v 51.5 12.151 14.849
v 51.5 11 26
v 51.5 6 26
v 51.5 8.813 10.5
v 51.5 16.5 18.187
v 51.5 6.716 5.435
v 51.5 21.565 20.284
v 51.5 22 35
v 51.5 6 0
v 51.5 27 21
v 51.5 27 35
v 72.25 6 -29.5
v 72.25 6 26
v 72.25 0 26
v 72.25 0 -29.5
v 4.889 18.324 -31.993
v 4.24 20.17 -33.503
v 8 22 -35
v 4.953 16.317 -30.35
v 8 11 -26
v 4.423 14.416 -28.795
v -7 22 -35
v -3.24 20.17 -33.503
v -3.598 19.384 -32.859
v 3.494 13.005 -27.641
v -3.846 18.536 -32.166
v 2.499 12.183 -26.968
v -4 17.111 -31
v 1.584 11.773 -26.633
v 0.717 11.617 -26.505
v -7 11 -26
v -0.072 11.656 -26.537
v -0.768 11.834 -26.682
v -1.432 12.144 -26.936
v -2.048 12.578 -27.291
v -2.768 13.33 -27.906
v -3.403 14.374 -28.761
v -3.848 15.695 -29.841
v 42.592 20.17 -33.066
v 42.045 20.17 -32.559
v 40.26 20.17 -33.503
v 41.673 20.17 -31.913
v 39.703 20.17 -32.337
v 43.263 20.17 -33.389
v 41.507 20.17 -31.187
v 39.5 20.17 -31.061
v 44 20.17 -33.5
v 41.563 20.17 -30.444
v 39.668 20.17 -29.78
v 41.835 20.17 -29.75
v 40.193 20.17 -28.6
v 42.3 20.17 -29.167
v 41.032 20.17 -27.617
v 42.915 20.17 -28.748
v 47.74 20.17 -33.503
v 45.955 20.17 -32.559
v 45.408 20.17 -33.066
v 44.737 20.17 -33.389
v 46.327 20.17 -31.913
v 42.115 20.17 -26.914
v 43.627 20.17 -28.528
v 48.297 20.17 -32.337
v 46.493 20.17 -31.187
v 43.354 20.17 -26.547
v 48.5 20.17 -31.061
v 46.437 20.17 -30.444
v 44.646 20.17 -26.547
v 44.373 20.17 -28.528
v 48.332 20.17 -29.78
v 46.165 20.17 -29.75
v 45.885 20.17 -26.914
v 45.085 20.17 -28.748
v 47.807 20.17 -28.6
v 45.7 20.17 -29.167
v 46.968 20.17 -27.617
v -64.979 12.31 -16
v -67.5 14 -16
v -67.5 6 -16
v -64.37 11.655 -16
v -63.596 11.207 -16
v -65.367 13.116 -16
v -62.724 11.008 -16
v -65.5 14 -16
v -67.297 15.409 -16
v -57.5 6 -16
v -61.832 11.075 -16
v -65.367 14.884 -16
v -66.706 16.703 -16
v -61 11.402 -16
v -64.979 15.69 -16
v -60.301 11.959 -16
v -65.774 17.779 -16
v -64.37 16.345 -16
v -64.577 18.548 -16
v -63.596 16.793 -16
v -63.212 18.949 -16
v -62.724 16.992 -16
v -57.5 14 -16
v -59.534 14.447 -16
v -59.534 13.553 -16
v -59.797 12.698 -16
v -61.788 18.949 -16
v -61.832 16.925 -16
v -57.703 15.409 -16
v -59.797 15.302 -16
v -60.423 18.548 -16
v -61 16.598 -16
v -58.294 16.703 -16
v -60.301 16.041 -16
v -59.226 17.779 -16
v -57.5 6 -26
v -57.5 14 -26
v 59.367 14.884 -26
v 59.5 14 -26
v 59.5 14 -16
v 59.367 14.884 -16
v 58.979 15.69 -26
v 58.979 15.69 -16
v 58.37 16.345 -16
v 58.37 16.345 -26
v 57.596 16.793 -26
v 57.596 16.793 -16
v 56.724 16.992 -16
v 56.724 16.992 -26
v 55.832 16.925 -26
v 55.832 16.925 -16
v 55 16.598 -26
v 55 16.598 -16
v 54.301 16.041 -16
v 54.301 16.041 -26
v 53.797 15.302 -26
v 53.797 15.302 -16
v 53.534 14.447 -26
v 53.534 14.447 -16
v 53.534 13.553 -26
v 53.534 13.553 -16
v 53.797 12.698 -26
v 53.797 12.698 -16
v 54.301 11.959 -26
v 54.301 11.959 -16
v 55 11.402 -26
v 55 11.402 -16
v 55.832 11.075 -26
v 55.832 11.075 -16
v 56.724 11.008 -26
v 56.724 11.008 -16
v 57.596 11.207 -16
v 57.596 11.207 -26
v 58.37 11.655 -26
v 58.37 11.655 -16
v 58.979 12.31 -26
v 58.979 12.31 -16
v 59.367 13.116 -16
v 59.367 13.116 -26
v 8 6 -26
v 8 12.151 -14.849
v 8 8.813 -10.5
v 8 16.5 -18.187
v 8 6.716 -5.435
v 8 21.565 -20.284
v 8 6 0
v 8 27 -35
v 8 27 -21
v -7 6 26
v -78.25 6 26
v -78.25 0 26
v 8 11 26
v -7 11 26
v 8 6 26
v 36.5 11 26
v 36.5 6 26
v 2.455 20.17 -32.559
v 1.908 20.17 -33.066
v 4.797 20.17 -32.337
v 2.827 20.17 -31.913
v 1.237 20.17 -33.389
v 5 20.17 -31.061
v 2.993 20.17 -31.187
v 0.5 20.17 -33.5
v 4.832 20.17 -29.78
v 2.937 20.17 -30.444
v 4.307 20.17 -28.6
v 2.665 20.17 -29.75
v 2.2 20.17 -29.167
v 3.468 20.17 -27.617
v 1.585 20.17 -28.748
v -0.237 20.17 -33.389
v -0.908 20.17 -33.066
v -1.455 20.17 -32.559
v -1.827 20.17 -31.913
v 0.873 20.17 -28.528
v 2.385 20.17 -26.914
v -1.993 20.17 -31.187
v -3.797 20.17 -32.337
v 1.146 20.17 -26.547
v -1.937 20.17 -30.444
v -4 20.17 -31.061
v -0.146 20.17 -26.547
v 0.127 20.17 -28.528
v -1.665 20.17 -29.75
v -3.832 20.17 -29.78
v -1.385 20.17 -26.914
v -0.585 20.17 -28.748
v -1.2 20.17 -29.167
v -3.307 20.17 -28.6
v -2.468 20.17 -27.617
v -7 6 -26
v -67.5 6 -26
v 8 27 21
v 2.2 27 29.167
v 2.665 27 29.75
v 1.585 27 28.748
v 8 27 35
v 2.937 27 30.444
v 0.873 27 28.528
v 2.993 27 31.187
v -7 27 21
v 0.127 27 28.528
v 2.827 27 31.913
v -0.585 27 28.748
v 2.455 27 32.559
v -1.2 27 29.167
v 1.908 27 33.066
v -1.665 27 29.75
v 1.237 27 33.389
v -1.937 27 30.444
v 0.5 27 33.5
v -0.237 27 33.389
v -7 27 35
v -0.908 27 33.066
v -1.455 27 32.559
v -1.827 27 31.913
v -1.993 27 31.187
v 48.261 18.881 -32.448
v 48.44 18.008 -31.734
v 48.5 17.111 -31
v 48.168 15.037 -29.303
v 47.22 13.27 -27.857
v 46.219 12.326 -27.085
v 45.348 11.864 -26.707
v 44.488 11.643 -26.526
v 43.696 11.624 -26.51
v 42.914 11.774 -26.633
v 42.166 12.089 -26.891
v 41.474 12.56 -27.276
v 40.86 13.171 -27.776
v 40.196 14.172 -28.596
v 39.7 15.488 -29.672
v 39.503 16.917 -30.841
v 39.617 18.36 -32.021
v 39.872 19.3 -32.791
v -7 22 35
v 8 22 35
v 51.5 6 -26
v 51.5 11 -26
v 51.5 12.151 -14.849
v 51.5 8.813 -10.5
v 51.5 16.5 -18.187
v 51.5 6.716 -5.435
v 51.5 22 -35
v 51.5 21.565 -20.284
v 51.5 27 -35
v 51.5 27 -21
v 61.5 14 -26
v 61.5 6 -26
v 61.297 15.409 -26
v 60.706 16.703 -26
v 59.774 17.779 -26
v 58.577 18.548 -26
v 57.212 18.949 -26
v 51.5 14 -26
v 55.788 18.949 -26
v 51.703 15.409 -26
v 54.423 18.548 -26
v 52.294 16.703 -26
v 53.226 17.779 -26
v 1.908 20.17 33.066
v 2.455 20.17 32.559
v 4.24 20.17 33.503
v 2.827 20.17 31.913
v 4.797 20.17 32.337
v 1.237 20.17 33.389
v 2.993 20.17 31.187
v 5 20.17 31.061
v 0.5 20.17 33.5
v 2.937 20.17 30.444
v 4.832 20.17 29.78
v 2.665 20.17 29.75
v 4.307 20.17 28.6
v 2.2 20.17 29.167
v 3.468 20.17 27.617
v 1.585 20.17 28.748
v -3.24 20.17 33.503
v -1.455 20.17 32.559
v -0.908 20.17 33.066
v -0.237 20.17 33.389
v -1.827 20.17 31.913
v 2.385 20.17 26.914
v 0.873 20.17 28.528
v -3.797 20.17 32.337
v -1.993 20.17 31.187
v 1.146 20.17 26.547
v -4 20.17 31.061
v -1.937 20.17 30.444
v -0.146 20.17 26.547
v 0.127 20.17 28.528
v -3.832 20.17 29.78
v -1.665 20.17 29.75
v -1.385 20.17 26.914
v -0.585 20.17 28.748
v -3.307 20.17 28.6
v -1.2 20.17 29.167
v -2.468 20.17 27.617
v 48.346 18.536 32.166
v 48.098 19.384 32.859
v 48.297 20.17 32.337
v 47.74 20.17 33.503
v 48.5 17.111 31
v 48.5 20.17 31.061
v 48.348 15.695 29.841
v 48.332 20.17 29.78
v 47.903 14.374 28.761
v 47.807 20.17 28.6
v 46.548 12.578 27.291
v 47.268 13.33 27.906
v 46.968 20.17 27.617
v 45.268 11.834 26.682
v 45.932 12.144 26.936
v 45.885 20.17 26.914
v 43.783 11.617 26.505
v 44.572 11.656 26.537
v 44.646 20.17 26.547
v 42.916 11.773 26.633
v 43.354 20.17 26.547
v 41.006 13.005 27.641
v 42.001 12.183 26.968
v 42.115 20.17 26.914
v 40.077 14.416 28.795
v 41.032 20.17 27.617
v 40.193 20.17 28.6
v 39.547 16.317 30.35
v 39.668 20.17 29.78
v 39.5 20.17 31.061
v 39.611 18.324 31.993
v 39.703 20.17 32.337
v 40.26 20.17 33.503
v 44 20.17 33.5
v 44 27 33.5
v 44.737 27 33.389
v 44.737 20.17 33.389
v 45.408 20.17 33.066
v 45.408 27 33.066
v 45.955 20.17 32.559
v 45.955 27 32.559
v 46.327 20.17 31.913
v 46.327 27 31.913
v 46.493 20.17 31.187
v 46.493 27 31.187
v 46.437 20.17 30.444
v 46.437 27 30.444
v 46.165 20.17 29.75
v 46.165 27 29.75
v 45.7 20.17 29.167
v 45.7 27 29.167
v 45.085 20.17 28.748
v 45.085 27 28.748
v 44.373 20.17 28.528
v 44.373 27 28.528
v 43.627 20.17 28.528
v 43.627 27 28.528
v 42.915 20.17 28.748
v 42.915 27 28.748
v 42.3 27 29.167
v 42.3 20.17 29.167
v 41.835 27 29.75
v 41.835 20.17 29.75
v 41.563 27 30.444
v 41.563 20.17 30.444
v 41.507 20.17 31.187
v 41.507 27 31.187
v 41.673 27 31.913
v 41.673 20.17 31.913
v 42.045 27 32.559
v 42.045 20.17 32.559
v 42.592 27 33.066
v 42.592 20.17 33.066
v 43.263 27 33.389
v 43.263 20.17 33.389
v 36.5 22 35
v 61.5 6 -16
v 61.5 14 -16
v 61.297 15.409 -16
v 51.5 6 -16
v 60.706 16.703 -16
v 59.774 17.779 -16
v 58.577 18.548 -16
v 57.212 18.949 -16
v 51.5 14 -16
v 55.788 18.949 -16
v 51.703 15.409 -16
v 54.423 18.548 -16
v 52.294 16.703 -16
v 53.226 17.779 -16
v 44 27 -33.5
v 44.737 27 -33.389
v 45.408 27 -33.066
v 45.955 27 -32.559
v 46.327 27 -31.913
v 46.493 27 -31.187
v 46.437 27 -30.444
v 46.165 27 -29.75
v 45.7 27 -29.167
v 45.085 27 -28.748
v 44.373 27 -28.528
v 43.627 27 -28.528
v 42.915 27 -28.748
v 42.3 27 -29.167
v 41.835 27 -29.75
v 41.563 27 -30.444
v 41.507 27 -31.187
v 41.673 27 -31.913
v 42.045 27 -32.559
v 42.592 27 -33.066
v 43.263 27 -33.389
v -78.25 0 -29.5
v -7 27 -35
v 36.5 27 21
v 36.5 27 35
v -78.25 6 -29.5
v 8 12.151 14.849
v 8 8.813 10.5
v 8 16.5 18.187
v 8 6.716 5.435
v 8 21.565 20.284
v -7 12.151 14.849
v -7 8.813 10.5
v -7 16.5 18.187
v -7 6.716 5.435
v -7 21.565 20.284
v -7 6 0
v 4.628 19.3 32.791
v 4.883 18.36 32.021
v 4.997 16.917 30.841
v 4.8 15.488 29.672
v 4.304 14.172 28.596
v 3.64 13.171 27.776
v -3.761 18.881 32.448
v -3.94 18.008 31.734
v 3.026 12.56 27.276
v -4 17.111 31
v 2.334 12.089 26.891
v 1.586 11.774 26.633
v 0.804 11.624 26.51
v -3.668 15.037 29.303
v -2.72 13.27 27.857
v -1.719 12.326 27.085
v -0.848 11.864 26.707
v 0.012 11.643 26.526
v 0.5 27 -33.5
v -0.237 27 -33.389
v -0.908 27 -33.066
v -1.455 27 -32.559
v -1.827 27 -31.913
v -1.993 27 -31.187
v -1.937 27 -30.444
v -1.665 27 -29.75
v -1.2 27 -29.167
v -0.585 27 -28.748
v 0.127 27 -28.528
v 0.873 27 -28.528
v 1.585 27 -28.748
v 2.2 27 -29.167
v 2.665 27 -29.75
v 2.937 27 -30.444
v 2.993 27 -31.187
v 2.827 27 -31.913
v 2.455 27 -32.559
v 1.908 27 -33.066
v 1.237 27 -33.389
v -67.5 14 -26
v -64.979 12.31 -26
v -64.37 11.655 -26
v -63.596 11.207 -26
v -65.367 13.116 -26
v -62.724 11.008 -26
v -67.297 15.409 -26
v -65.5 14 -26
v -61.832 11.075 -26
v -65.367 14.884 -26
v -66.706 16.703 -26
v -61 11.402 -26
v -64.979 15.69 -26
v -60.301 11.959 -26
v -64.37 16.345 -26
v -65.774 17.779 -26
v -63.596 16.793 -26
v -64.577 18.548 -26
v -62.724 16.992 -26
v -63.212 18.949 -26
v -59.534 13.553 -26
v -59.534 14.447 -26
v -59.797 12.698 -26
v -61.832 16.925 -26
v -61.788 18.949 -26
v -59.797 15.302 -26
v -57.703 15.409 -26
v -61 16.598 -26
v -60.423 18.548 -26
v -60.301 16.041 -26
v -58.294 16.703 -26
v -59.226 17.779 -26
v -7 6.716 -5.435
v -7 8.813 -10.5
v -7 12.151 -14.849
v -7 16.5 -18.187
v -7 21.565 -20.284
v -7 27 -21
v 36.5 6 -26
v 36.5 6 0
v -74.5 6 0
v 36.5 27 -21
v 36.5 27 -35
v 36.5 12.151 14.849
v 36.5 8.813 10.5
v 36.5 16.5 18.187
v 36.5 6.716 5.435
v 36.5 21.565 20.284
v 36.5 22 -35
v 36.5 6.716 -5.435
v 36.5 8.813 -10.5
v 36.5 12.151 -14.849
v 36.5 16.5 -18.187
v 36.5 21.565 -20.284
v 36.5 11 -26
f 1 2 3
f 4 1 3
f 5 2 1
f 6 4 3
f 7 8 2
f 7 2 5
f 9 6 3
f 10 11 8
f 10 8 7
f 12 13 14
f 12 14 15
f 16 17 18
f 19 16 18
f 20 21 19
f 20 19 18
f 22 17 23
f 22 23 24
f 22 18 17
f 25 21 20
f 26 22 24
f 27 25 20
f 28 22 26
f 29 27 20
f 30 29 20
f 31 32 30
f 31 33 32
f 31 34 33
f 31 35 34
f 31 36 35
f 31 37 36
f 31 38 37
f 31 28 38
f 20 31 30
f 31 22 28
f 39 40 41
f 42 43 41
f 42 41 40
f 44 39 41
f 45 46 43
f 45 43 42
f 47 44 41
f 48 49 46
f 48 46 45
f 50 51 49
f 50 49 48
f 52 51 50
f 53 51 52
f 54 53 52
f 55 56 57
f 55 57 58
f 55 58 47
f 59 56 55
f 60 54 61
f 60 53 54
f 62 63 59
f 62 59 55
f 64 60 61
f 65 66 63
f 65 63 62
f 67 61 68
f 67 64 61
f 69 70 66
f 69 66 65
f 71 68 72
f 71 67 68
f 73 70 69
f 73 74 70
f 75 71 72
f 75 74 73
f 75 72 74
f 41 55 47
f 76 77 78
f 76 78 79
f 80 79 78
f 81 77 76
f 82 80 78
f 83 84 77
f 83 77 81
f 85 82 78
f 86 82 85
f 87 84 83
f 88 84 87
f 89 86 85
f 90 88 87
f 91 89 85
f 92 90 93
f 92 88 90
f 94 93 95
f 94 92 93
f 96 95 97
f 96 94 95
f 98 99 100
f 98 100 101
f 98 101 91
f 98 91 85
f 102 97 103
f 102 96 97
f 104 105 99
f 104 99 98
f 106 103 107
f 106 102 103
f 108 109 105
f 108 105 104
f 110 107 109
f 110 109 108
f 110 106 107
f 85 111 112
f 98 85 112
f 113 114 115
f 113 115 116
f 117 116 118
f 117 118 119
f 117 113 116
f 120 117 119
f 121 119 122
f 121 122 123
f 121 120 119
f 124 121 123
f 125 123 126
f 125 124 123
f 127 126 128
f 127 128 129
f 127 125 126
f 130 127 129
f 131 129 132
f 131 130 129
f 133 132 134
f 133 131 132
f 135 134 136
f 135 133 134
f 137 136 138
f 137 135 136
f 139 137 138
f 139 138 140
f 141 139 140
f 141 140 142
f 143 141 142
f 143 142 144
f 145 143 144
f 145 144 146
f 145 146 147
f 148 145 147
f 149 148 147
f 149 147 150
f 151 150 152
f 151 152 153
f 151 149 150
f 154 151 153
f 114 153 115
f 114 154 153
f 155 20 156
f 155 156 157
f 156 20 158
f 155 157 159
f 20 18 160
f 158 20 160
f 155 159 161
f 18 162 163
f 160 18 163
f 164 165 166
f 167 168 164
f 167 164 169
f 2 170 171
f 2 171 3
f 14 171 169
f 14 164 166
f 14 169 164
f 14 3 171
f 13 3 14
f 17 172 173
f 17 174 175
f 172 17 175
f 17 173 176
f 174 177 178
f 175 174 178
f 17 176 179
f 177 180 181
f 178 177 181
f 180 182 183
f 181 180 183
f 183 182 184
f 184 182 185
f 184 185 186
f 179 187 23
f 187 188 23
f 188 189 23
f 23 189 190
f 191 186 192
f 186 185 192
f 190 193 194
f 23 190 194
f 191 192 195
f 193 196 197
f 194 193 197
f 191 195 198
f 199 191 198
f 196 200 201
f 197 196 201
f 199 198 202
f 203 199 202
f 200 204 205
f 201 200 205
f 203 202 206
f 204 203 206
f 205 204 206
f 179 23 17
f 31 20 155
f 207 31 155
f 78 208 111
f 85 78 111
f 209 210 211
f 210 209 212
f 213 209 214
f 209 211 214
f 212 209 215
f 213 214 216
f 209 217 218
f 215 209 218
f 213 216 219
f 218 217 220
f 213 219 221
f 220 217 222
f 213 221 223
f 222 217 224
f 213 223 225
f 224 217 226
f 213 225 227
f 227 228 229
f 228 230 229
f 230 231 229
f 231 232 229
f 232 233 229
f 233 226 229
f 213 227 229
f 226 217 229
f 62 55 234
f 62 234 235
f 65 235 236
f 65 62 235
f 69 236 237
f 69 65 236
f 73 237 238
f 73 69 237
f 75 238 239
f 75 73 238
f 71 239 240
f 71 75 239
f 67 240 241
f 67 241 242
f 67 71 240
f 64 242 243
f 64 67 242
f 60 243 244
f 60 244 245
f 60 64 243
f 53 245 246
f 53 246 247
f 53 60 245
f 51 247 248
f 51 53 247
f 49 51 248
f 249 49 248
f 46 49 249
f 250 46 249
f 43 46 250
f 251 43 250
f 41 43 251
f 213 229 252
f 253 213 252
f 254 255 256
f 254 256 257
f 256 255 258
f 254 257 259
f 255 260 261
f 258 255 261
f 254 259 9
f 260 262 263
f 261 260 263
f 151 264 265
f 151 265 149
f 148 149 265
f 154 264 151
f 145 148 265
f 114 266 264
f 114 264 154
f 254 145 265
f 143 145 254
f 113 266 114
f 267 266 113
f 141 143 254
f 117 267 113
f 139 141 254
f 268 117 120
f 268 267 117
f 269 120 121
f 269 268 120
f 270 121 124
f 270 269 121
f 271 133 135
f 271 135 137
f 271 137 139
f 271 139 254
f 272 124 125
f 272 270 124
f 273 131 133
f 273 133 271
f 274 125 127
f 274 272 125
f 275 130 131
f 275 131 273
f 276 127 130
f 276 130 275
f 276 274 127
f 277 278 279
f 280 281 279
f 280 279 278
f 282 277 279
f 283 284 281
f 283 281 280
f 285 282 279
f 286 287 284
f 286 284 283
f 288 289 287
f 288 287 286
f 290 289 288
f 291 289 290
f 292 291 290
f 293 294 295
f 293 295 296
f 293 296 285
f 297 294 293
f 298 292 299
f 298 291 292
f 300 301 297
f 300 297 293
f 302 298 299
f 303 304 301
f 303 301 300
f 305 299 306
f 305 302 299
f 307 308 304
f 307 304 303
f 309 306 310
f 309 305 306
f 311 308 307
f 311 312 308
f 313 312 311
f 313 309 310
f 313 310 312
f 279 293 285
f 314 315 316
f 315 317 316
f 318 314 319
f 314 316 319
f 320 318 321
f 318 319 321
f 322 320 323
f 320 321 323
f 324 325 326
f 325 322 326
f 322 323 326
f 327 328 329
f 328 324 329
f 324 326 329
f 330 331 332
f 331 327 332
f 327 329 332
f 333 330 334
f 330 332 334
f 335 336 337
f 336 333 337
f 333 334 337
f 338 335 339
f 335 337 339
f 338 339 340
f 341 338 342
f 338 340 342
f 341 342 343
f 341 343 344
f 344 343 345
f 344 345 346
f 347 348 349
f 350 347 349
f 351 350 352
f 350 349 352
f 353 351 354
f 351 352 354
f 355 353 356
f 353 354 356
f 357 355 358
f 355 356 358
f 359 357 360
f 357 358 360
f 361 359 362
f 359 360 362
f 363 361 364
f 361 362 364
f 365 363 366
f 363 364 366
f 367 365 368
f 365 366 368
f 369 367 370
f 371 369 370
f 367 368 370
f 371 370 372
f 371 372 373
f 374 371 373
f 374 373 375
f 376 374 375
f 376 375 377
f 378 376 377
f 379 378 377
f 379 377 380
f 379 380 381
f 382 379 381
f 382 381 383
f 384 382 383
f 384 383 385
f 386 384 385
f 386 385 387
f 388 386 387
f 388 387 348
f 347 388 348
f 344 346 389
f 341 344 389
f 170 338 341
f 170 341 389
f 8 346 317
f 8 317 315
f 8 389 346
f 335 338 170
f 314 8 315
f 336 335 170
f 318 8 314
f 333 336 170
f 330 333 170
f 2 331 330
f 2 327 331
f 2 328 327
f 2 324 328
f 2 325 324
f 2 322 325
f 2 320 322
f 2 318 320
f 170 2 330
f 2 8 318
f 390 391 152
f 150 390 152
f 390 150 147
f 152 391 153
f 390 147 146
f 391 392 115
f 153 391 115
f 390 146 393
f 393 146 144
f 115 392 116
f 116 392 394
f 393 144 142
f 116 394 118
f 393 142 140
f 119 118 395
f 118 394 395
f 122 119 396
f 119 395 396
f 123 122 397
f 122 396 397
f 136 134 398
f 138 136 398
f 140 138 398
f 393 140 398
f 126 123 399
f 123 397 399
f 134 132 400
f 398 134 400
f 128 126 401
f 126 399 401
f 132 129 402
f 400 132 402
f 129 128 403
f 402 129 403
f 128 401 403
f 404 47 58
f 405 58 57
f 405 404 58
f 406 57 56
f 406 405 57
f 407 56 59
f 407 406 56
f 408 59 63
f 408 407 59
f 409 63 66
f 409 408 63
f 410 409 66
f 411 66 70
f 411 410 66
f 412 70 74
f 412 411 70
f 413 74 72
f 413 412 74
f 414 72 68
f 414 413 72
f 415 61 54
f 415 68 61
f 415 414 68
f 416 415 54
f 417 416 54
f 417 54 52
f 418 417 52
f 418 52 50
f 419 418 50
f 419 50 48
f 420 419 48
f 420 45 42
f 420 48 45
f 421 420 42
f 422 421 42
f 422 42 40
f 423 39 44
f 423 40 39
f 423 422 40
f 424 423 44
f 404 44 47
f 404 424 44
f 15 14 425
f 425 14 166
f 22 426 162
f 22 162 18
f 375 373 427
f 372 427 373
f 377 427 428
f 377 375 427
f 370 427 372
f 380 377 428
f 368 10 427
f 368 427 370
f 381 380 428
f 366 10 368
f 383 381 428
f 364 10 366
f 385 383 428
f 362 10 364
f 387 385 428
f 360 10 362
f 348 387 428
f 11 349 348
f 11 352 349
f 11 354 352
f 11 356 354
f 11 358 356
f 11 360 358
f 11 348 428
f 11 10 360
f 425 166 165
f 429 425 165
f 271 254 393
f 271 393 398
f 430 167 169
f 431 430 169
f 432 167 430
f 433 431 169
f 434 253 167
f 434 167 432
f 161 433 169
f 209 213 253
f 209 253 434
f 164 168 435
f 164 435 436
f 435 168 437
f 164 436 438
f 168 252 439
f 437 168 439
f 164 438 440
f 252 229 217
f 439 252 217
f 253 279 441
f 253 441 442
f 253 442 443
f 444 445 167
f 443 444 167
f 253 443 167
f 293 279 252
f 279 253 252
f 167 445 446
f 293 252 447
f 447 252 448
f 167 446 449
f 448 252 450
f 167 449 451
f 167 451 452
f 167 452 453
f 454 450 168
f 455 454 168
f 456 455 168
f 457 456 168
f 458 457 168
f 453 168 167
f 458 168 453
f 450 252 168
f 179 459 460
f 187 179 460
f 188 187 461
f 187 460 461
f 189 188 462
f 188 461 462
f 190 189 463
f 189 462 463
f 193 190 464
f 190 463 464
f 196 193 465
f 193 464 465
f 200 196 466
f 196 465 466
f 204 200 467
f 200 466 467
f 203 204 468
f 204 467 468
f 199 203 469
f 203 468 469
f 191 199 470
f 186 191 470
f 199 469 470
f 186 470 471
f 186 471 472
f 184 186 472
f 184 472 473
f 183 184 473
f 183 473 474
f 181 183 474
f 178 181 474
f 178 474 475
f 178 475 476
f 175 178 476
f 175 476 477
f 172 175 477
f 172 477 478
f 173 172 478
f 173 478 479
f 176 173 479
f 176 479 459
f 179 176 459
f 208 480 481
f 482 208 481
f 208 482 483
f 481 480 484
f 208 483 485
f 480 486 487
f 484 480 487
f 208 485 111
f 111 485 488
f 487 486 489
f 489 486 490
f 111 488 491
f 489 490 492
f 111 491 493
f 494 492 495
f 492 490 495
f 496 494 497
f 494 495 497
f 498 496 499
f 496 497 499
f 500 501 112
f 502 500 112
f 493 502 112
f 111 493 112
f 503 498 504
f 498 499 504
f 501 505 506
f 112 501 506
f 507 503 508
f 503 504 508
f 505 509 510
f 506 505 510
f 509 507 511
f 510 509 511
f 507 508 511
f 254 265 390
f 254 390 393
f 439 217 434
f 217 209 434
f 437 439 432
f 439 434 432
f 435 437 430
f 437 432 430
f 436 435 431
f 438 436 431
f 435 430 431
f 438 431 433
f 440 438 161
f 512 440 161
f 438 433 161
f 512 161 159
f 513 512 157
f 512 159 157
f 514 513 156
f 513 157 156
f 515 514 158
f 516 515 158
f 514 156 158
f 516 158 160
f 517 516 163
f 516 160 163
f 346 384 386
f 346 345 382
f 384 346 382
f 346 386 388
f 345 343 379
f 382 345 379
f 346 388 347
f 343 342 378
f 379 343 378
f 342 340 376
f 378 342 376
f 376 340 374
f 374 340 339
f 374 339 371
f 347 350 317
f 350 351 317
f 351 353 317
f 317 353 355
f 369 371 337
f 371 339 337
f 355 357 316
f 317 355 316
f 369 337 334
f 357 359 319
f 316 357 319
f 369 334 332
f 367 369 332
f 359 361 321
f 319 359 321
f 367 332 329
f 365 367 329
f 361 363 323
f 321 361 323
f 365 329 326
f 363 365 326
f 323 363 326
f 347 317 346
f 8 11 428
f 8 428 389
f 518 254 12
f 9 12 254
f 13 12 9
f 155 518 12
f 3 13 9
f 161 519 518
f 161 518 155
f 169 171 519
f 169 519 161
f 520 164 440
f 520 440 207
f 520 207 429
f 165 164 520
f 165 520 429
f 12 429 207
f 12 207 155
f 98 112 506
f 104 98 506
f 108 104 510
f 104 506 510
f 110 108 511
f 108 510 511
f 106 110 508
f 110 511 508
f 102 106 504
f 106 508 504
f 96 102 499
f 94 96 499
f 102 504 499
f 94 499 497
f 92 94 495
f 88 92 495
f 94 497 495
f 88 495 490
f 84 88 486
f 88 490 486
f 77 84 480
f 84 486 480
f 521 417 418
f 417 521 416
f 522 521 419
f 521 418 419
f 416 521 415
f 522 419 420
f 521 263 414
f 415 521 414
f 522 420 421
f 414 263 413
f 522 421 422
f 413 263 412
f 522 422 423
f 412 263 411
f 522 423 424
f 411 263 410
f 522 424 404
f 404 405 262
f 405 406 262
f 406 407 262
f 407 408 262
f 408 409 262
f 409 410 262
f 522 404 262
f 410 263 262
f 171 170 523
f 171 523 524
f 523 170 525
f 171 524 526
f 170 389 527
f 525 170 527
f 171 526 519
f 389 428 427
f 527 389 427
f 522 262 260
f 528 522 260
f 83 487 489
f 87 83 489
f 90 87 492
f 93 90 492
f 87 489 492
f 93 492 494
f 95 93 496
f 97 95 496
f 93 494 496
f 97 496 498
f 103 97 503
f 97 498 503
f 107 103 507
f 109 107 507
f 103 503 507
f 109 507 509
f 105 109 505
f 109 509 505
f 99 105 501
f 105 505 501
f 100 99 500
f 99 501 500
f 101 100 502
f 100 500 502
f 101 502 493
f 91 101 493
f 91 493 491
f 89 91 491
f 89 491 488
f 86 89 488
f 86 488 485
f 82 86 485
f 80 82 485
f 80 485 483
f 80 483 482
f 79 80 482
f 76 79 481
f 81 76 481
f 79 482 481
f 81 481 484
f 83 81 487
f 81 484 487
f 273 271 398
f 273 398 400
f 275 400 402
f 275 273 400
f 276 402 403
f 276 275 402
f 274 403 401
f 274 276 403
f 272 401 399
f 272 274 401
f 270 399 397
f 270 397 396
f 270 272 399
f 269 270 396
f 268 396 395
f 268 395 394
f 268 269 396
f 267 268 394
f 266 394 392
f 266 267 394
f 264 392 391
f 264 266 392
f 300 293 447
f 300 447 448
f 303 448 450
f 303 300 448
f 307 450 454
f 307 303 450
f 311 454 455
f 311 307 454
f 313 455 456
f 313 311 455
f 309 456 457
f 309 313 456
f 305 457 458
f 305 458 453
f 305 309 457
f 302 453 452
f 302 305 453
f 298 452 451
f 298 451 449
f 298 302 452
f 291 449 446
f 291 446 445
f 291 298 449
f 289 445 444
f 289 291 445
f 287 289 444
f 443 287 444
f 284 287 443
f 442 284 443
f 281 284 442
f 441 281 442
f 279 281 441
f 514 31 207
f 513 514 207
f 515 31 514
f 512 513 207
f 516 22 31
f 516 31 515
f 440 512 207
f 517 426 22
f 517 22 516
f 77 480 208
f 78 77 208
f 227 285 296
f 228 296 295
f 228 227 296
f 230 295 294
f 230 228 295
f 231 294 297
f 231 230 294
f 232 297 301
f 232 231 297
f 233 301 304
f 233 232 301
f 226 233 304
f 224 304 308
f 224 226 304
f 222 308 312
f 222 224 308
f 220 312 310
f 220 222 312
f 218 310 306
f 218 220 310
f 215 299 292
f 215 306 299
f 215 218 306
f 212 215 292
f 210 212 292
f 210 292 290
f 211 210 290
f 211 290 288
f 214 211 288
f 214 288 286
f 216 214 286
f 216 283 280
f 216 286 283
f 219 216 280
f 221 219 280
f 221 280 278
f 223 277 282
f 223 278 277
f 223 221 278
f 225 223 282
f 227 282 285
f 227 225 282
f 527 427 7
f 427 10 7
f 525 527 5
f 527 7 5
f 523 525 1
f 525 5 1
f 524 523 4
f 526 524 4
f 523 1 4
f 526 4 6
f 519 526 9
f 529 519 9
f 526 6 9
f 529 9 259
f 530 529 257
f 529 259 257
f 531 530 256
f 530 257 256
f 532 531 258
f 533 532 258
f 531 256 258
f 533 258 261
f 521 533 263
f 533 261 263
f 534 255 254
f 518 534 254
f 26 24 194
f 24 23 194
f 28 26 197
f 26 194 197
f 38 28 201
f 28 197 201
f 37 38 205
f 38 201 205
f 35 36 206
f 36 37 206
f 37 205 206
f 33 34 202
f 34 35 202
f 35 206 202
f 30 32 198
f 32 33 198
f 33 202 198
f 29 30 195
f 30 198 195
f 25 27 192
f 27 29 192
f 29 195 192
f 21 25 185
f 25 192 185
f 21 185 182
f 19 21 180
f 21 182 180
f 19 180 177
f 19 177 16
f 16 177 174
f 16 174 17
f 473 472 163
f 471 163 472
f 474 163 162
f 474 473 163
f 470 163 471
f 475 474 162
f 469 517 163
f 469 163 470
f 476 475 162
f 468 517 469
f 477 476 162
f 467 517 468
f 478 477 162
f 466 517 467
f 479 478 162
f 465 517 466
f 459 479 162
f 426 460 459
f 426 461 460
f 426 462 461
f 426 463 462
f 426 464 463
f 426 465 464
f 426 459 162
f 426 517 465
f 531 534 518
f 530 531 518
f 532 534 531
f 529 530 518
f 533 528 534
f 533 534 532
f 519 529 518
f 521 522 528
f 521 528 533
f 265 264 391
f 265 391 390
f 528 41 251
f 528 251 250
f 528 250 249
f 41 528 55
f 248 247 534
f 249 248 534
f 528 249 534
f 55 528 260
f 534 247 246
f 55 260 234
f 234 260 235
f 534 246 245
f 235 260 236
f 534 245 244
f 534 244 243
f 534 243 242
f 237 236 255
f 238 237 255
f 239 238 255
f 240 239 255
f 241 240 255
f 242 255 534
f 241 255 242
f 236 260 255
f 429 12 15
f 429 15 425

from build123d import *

# Parameters (mm, degrees)
CROQUIS1_W                                 = 149
CROQUIS1_H                                 = 53
SALIENTE_EXTRUIR1_DEPTH                    = 6
SALIENTE_EXTRUIR2_DEPTH                    = 15
SALIENTE_EXTRUIR5_DEPTH                    = 15
CROQUIS3_R                                 = 21
CORTAR_EXTRUIR2_DEPTH                      = 140.238105417
CROQUIS6_R                                 = 3
SALIENTE_EXTRUIR11_DEPTH                   = 10
CROQUIS12_W                                = 53
CROQUIS12_H                                = 6
SALIENTE_EXTRUIR24_DEPTH                   = 3.75
CROQUIS13_W                                = 152.75
CROQUIS13_H                                = 6
SALIENTE_EXTRUIR25_DEPTH                   = 3
CROQUIS14_W                                = 2.25
CROQUIS14_H                                = 56
CORTAR_EXTRUIR3_DEPTH                      = 96.928684448
CROQUIS17_W                                = 150.5
CROQUIS17_H                                = 0.5
CORTAR_EXTRUIR4_DEPTH                      = 96.928684448
CROQUIS18_W                                = 100
CROQUIS18_H                                = 60
CORTAR_EXTRUIR5_DEPTH                      = 88.876689173
SALIENTE_EXTRUIR27_DEPTH                   = 15
CROQUIS20_R                                = 2.5
CORTAR_EXTRUIR6_DEPTH                      = 10
SIMETR_A6_COPY_1_DEPTH                     = 15
SIMETR_A6_COPY_2_SKETCH_R                  = 2.5
SIMETR_A6_COPY_2_DEPTH                     = 10
CROQUIS21_R                                = 4.5
CORTAR_EXTRUIR7_DEPTH                      = 10
SIMETR_A7_AT_THE_SECOND_PLANE_COPY_1_SKE_R = 4.5
SIMETR_A7_AT_THE_SECOND_PLANE_COPY_1_DEPTH = 10


with BuildPart() as part:
    # Croquis1 → Saliente-Extruir1 (new body)
    with BuildSketch(Plane(origin=(0, 0, 0), x_dir=(1, 0, 0), z_dir=(0, 1, 0))):
        Rectangle(CROQUIS1_W, CROQUIS1_H)
    extrude(amount=SALIENTE_EXTRUIR1_DEPTH)

    # Croquis2 → Saliente-Extruir2 (add)
    with BuildSketch(Plane(origin=(51.5, 0, 0), x_dir=(0, 0, -1), z_dir=(1, 0, 0))):
        with BuildLine():
            Line((26, 6), (-26, 6))
            Line((-26, 6), (-26, 27))
            ThreePointArc((-26, 27), (0, 53), (26, 27))
            Line((26, 27), (26, 6))
        make_face()
    extrude(amount=-SALIENTE_EXTRUIR2_DEPTH)

    # Croquis5 → Saliente-Extruir5 (add)
    with BuildSketch(Plane.ZY.offset(-8)):
        with BuildLine():
            Line((-26, 6), (26, 6))
            Line((26, 6), (26, 27))
            ThreePointArc((26, 27), (0, 53), (-26, 27))
            Line((-26, 27), (-26, 6))
        make_face()
    extrude(amount=SALIENTE_EXTRUIR5_DEPTH)

    # Croquis3 → Cortar-Extruir2 (cut, through all)
    with BuildSketch(Plane(origin=(51.5, 0, 0), x_dir=(0, 0, -1), z_dir=(1, 0, 0))):
        with Locations(Location((0, 27, 0), (0, 0, 270))):
            Circle(CROQUIS3_R)
    extrude(amount=-CORTAR_EXTRUIR2_DEPTH, mode=Mode.SUBTRACT)

    # Croquis12 → Saliente-Extruir24 (add)
    with BuildSketch(Plane.ZY.offset(74.5)):
        with Locations((0, 3)):
            Rectangle(CROQUIS12_W, CROQUIS12_H)
    extrude(amount=SALIENTE_EXTRUIR24_DEPTH)

    # Croquis13 → Saliente-Extruir25 (add)
    with BuildSketch(Plane(origin=(0, 0, -26.5), x_dir=(-1, 0, 0), z_dir=(0, 0, -1))):
        with Locations((1.875, 3)):
            Rectangle(CROQUIS13_W, CROQUIS13_H)
    extrude(amount=SALIENTE_EXTRUIR25_DEPTH)

    # Croquis14 → Cortar-Extruir3 (cut, through all)
    with BuildSketch(Plane(origin=(0, 6, 0), x_dir=(1, 0, 0), z_dir=(0, 1, 0))):
        with Locations((73.375, 1.5)):
            Rectangle(CROQUIS14_W, CROQUIS14_H)
    extrude(amount=-CORTAR_EXTRUIR3_DEPTH, mode=Mode.SUBTRACT)

    # Croquis17 → Cortar-Extruir4 (cut, through all)
    with BuildSketch(Plane(origin=(0, 6, 0), x_dir=(1, 0, 0), z_dir=(0, 1, 0))):
        with Locations((-3, -26.25)):
            Rectangle(CROQUIS17_W, CROQUIS17_H)
    extrude(amount=-CORTAR_EXTRUIR4_DEPTH, mode=Mode.SUBTRACT)

    # Croquis18 → Cortar-Extruir5 (cut, through all)
    with BuildSketch(Plane(origin=(0, 27, 0), x_dir=(1, 0, 0), z_dir=(0, 1, 0))):
        with Locations((22.25, 1.75)):
            Rectangle(CROQUIS18_W, CROQUIS18_H)
    extrude(amount=CORTAR_EXTRUIR5_DEPTH, mode=Mode.SUBTRACT)

    # Croquis19 → Saliente-Extruir27 (add)
    with BuildSketch(Plane(origin=(51.5, 0, 0), x_dir=(0, 0, -1), z_dir=(1, 0, 0))):
        Polygon((-26, 27), (-35, 27), (-35, 22), (-26, 11), align=None)
    saliente_extruir27 = extrude(amount=-SALIENTE_EXTRUIR27_DEPTH)

    # Croquis20 → Cortar-Extruir6 (cut)
    with BuildSketch(Plane(origin=(0, 27, 0), x_dir=(1, 0, 0), z_dir=(0, 1, 0))):
        with Locations(Location((44, -31, 0), (0, 0, 270))):
            Circle(CROQUIS20_R)
    cortar_extruir6 = extrude(amount=-CORTAR_EXTRUIR6_DEPTH, mode=Mode.SUBTRACT)

    # Simetría3: Saliente-Extruir27 across plane
    add(saliente_extruir27.mirror(Plane.XY))

    # Simetr_a3 2: Cortar-Extruir6 across plane
    add(cortar_extruir6.mirror(Plane.XY), mode=Mode.SUBTRACT)

    # Simetría6: Saliente-Extruir27, Cortar-Extruir6 across plane
    add(saliente_extruir27.mirror(Plane(origin=(22.25, 0, 0), x_dir=(0, 0, 1), z_dir=(1, 0, 0))))
    add(cortar_extruir6.mirror(Plane(origin=(22.25, 0, 0), x_dir=(0, 0, 1), z_dir=(1, 0, 0))), mode=Mode.SUBTRACT)

    # Simetría6 copy 1 sketch → Simetría6 copy 1 (add)
    with BuildSketch(Plane.ZY.offset(7)):
        Polygon((-26, 27), (-35, 27), (-35, 22), (-26, 11), align=None)
    extrude(amount=-SIMETR_A6_COPY_1_DEPTH)

    # Simetría6 copy 2 sketch → Simetría6 copy 2 (cut)
    with BuildSketch(Plane(origin=(44.5, 27, 0), x_dir=(-1, 0, 0), z_dir=(0, 1, 0))):
        with Locations(Location((44, -31, 0), (0, 0, 270))):
            Circle(SIMETR_A6_COPY_2_SKETCH_R)
    extrude(amount=-SIMETR_A6_COPY_2_DEPTH, mode=Mode.SUBTRACT)

    # Croquis21 → Cortar-Extruir7 (cut)
    with BuildSketch(Plane(origin=(0, 20.17, 0), x_dir=(1, 0, 0), z_dir=(0, 1, 0))):
        with Locations((44, -31)):
            Circle(CROQUIS21_R)
    cortar_extruir7 = extrude(amount=-CORTAR_EXTRUIR7_DEPTH, mode=Mode.SUBTRACT)

    # Simetría7: Cortar-Extruir7 across plane
    add(cortar_extruir7.mirror(Plane.XY), mode=Mode.SUBTRACT)

    # Simetría7 at the second plane: Cortar-Extruir7 across plane
    add(cortar_extruir7.mirror(Plane(origin=(22.25, 0, 0), x_dir=(0, 0, 1), z_dir=(1, 0, 0))), mode=Mode.SUBTRACT)

    # Simetría7 at the second plane copy 1 ske → Simetría7 at the second plane copy 1 (cut)
    with BuildSketch(Plane(origin=(44.5, 20.17, 0), x_dir=(-1, 0, 0), z_dir=(0, 1, 0))):
        with Locations((44, -31)):
            Circle(SIMETR_A7_AT_THE_SECOND_PLANE_COPY_1_SKE_R)
    extrude(amount=-SIMETR_A7_AT_THE_SECOND_PLANE_COPY_1_DEPTH, mode=Mode.SUBTRACT)


with BuildPart() as body_2:
    # Croquis6 → Saliente-Extruir11 (new body)
    with BuildSketch(Plane.XY.offset(-26)):
        with BuildLine():
            Line((61.5, 6), (51.5, 6))
            Line((51.5, 6), (51.5, 14))
            ThreePointArc((51.5, 14), (56.5, 19), (61.5, 14))
            Line((61.5, 14), (61.5, 6))
        make_face()
        with Locations((56.5, 14)):
            Circle(CROQUIS6_R, mode=Mode.SUBTRACT)
    extrude(amount=SALIENTE_EXTRUIR11_DEPTH)


with BuildPart() as body_3:
    # Simetría2: mirrored copy
    add(body_2.part.mirror(Plane(origin=(-3, 0, 0), x_dir=(0, 0, 1), z_dir=(1, 0, 0))))


solid = Compound([part.part, body_2.part, body_3.part])
